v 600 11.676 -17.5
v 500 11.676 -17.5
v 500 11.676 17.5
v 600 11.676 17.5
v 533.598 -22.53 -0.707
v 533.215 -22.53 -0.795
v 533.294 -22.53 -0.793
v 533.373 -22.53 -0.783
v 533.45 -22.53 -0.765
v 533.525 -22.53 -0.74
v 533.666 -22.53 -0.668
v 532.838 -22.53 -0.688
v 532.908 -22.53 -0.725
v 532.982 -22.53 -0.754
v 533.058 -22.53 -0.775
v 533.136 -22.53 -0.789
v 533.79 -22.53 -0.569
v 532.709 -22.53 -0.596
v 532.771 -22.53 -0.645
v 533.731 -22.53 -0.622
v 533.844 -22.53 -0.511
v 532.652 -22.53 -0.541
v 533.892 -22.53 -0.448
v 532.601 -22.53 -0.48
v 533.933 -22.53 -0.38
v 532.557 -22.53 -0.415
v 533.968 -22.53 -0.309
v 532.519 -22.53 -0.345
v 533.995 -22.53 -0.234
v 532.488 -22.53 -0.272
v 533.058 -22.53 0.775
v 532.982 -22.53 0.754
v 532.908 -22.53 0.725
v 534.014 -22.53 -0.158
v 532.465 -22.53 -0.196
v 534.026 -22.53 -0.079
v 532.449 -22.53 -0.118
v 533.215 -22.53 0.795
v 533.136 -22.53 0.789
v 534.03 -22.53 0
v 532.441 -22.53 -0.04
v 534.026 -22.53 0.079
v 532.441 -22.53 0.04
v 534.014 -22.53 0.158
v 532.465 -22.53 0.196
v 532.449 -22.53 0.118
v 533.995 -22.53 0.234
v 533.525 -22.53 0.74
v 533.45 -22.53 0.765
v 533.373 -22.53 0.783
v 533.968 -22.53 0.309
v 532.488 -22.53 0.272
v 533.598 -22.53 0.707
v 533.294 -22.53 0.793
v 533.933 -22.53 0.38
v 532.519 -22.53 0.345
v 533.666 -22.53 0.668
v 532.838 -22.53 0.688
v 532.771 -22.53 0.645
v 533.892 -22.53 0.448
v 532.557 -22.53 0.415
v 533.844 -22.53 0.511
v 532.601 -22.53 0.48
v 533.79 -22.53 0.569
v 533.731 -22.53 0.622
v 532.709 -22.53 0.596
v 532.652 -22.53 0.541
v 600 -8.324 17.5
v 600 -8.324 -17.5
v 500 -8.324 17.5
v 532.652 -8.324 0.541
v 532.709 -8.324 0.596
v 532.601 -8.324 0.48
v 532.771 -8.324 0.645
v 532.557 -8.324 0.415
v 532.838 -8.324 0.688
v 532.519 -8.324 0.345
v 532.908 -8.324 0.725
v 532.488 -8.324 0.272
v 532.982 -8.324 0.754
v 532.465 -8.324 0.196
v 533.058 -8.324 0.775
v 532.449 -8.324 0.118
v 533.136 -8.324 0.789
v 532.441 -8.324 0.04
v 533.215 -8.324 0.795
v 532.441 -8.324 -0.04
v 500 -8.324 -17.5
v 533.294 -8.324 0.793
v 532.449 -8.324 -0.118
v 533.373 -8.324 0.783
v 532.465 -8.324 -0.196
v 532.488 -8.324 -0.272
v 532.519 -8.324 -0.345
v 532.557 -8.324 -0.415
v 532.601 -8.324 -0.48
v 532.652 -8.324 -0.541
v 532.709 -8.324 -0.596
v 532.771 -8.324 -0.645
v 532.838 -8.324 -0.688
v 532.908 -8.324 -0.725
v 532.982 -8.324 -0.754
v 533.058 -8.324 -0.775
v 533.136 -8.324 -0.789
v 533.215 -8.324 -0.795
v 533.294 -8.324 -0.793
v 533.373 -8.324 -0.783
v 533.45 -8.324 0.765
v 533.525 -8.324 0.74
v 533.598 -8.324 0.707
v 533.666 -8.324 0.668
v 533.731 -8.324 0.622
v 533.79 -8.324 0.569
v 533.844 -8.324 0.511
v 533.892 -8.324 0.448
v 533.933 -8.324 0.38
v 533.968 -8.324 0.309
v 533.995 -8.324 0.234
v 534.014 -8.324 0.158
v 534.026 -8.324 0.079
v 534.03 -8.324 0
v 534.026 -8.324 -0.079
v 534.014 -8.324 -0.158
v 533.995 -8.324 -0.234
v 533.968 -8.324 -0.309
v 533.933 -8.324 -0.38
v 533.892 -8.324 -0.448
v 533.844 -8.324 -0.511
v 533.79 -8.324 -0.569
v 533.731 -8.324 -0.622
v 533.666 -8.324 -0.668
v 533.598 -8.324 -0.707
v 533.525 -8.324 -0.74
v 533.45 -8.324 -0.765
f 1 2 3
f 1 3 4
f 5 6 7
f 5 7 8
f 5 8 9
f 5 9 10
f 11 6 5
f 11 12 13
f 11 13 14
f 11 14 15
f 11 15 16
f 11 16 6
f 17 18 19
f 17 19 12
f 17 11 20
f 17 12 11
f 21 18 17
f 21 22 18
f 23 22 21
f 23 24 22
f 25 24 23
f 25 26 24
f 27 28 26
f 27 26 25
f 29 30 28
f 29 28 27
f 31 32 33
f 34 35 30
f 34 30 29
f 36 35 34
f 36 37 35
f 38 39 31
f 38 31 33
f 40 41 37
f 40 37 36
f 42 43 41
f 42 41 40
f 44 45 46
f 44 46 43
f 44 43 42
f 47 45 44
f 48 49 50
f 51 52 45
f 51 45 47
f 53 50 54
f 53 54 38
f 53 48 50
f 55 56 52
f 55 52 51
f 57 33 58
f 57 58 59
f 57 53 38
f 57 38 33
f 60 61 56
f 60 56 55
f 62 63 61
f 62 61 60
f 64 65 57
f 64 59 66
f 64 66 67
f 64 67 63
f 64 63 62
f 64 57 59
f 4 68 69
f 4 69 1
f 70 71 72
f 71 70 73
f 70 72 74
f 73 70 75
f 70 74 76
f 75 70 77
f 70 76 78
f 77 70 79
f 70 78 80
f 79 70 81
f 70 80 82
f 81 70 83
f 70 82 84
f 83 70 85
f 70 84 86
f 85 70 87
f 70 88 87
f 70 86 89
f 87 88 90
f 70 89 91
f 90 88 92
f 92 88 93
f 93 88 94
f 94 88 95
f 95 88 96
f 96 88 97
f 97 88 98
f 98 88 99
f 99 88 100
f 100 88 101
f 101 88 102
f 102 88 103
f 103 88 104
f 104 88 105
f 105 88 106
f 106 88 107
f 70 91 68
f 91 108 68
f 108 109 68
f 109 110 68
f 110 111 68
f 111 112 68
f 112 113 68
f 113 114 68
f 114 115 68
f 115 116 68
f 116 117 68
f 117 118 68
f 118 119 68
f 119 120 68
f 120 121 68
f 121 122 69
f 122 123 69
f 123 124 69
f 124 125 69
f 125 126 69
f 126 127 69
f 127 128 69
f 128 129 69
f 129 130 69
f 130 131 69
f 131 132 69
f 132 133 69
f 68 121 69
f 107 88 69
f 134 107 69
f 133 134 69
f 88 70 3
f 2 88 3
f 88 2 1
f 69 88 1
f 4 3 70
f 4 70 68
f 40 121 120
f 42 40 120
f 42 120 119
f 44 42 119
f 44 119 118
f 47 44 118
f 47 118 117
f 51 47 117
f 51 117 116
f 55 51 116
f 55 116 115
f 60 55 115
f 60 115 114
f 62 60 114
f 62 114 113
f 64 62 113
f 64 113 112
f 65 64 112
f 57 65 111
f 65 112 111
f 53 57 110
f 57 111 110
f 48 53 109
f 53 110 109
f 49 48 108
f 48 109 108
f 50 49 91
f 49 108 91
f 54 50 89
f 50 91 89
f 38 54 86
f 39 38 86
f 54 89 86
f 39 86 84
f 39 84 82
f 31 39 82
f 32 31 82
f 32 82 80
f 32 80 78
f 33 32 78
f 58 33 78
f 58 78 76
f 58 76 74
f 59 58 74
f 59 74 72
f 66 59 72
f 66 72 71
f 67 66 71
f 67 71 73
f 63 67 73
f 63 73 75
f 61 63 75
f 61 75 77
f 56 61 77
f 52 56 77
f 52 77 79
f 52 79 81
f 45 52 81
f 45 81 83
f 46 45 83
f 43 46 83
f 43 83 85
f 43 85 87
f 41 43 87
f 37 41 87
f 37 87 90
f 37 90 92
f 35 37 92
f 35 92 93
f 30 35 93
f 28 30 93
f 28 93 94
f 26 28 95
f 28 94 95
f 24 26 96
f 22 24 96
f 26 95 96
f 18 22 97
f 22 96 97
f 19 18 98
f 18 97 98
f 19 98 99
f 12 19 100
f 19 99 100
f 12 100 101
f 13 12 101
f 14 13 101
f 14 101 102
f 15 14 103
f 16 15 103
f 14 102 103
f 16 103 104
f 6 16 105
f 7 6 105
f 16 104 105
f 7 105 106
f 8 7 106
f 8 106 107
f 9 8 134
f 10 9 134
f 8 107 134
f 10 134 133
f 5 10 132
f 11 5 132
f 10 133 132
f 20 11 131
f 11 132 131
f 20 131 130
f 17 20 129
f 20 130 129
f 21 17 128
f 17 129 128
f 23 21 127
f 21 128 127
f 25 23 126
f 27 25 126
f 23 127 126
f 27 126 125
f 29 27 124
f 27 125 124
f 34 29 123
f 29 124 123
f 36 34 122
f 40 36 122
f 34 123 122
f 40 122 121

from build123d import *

# Parameters (mm, degrees)
BOX_W             = 100
BOX_H             = 20
BOX_DEPTH         = 35
CYLINDER001_R     = 0.795
CYLINDER001_DEPTH = 15


with BuildPart() as cube:
    # Box → Box (new body)
    with BuildSketch(Plane(origin=(500, -8.3245, -17.5), x_dir=(1, 0, 0), z_dir=(0, 0, 1))):
        with Locations((50, 10)):
            Rectangle(BOX_W, BOX_H)
    extrude(amount=BOX_DEPTH)


with BuildPart() as fusion:
    # Cylinder001 → Cylinder001 (new body)
    with BuildSketch(Plane(origin=(533.235, -7.5295, 0), x_dir=(1, 0, 0), z_dir=(0, -1, 0))):
        Circle(CYLINDER001_R)
    extrude(amount=CYLINDER001_DEPTH)

    # Fusion: union Cube
    add(cube.part)


solid = fusion.part
